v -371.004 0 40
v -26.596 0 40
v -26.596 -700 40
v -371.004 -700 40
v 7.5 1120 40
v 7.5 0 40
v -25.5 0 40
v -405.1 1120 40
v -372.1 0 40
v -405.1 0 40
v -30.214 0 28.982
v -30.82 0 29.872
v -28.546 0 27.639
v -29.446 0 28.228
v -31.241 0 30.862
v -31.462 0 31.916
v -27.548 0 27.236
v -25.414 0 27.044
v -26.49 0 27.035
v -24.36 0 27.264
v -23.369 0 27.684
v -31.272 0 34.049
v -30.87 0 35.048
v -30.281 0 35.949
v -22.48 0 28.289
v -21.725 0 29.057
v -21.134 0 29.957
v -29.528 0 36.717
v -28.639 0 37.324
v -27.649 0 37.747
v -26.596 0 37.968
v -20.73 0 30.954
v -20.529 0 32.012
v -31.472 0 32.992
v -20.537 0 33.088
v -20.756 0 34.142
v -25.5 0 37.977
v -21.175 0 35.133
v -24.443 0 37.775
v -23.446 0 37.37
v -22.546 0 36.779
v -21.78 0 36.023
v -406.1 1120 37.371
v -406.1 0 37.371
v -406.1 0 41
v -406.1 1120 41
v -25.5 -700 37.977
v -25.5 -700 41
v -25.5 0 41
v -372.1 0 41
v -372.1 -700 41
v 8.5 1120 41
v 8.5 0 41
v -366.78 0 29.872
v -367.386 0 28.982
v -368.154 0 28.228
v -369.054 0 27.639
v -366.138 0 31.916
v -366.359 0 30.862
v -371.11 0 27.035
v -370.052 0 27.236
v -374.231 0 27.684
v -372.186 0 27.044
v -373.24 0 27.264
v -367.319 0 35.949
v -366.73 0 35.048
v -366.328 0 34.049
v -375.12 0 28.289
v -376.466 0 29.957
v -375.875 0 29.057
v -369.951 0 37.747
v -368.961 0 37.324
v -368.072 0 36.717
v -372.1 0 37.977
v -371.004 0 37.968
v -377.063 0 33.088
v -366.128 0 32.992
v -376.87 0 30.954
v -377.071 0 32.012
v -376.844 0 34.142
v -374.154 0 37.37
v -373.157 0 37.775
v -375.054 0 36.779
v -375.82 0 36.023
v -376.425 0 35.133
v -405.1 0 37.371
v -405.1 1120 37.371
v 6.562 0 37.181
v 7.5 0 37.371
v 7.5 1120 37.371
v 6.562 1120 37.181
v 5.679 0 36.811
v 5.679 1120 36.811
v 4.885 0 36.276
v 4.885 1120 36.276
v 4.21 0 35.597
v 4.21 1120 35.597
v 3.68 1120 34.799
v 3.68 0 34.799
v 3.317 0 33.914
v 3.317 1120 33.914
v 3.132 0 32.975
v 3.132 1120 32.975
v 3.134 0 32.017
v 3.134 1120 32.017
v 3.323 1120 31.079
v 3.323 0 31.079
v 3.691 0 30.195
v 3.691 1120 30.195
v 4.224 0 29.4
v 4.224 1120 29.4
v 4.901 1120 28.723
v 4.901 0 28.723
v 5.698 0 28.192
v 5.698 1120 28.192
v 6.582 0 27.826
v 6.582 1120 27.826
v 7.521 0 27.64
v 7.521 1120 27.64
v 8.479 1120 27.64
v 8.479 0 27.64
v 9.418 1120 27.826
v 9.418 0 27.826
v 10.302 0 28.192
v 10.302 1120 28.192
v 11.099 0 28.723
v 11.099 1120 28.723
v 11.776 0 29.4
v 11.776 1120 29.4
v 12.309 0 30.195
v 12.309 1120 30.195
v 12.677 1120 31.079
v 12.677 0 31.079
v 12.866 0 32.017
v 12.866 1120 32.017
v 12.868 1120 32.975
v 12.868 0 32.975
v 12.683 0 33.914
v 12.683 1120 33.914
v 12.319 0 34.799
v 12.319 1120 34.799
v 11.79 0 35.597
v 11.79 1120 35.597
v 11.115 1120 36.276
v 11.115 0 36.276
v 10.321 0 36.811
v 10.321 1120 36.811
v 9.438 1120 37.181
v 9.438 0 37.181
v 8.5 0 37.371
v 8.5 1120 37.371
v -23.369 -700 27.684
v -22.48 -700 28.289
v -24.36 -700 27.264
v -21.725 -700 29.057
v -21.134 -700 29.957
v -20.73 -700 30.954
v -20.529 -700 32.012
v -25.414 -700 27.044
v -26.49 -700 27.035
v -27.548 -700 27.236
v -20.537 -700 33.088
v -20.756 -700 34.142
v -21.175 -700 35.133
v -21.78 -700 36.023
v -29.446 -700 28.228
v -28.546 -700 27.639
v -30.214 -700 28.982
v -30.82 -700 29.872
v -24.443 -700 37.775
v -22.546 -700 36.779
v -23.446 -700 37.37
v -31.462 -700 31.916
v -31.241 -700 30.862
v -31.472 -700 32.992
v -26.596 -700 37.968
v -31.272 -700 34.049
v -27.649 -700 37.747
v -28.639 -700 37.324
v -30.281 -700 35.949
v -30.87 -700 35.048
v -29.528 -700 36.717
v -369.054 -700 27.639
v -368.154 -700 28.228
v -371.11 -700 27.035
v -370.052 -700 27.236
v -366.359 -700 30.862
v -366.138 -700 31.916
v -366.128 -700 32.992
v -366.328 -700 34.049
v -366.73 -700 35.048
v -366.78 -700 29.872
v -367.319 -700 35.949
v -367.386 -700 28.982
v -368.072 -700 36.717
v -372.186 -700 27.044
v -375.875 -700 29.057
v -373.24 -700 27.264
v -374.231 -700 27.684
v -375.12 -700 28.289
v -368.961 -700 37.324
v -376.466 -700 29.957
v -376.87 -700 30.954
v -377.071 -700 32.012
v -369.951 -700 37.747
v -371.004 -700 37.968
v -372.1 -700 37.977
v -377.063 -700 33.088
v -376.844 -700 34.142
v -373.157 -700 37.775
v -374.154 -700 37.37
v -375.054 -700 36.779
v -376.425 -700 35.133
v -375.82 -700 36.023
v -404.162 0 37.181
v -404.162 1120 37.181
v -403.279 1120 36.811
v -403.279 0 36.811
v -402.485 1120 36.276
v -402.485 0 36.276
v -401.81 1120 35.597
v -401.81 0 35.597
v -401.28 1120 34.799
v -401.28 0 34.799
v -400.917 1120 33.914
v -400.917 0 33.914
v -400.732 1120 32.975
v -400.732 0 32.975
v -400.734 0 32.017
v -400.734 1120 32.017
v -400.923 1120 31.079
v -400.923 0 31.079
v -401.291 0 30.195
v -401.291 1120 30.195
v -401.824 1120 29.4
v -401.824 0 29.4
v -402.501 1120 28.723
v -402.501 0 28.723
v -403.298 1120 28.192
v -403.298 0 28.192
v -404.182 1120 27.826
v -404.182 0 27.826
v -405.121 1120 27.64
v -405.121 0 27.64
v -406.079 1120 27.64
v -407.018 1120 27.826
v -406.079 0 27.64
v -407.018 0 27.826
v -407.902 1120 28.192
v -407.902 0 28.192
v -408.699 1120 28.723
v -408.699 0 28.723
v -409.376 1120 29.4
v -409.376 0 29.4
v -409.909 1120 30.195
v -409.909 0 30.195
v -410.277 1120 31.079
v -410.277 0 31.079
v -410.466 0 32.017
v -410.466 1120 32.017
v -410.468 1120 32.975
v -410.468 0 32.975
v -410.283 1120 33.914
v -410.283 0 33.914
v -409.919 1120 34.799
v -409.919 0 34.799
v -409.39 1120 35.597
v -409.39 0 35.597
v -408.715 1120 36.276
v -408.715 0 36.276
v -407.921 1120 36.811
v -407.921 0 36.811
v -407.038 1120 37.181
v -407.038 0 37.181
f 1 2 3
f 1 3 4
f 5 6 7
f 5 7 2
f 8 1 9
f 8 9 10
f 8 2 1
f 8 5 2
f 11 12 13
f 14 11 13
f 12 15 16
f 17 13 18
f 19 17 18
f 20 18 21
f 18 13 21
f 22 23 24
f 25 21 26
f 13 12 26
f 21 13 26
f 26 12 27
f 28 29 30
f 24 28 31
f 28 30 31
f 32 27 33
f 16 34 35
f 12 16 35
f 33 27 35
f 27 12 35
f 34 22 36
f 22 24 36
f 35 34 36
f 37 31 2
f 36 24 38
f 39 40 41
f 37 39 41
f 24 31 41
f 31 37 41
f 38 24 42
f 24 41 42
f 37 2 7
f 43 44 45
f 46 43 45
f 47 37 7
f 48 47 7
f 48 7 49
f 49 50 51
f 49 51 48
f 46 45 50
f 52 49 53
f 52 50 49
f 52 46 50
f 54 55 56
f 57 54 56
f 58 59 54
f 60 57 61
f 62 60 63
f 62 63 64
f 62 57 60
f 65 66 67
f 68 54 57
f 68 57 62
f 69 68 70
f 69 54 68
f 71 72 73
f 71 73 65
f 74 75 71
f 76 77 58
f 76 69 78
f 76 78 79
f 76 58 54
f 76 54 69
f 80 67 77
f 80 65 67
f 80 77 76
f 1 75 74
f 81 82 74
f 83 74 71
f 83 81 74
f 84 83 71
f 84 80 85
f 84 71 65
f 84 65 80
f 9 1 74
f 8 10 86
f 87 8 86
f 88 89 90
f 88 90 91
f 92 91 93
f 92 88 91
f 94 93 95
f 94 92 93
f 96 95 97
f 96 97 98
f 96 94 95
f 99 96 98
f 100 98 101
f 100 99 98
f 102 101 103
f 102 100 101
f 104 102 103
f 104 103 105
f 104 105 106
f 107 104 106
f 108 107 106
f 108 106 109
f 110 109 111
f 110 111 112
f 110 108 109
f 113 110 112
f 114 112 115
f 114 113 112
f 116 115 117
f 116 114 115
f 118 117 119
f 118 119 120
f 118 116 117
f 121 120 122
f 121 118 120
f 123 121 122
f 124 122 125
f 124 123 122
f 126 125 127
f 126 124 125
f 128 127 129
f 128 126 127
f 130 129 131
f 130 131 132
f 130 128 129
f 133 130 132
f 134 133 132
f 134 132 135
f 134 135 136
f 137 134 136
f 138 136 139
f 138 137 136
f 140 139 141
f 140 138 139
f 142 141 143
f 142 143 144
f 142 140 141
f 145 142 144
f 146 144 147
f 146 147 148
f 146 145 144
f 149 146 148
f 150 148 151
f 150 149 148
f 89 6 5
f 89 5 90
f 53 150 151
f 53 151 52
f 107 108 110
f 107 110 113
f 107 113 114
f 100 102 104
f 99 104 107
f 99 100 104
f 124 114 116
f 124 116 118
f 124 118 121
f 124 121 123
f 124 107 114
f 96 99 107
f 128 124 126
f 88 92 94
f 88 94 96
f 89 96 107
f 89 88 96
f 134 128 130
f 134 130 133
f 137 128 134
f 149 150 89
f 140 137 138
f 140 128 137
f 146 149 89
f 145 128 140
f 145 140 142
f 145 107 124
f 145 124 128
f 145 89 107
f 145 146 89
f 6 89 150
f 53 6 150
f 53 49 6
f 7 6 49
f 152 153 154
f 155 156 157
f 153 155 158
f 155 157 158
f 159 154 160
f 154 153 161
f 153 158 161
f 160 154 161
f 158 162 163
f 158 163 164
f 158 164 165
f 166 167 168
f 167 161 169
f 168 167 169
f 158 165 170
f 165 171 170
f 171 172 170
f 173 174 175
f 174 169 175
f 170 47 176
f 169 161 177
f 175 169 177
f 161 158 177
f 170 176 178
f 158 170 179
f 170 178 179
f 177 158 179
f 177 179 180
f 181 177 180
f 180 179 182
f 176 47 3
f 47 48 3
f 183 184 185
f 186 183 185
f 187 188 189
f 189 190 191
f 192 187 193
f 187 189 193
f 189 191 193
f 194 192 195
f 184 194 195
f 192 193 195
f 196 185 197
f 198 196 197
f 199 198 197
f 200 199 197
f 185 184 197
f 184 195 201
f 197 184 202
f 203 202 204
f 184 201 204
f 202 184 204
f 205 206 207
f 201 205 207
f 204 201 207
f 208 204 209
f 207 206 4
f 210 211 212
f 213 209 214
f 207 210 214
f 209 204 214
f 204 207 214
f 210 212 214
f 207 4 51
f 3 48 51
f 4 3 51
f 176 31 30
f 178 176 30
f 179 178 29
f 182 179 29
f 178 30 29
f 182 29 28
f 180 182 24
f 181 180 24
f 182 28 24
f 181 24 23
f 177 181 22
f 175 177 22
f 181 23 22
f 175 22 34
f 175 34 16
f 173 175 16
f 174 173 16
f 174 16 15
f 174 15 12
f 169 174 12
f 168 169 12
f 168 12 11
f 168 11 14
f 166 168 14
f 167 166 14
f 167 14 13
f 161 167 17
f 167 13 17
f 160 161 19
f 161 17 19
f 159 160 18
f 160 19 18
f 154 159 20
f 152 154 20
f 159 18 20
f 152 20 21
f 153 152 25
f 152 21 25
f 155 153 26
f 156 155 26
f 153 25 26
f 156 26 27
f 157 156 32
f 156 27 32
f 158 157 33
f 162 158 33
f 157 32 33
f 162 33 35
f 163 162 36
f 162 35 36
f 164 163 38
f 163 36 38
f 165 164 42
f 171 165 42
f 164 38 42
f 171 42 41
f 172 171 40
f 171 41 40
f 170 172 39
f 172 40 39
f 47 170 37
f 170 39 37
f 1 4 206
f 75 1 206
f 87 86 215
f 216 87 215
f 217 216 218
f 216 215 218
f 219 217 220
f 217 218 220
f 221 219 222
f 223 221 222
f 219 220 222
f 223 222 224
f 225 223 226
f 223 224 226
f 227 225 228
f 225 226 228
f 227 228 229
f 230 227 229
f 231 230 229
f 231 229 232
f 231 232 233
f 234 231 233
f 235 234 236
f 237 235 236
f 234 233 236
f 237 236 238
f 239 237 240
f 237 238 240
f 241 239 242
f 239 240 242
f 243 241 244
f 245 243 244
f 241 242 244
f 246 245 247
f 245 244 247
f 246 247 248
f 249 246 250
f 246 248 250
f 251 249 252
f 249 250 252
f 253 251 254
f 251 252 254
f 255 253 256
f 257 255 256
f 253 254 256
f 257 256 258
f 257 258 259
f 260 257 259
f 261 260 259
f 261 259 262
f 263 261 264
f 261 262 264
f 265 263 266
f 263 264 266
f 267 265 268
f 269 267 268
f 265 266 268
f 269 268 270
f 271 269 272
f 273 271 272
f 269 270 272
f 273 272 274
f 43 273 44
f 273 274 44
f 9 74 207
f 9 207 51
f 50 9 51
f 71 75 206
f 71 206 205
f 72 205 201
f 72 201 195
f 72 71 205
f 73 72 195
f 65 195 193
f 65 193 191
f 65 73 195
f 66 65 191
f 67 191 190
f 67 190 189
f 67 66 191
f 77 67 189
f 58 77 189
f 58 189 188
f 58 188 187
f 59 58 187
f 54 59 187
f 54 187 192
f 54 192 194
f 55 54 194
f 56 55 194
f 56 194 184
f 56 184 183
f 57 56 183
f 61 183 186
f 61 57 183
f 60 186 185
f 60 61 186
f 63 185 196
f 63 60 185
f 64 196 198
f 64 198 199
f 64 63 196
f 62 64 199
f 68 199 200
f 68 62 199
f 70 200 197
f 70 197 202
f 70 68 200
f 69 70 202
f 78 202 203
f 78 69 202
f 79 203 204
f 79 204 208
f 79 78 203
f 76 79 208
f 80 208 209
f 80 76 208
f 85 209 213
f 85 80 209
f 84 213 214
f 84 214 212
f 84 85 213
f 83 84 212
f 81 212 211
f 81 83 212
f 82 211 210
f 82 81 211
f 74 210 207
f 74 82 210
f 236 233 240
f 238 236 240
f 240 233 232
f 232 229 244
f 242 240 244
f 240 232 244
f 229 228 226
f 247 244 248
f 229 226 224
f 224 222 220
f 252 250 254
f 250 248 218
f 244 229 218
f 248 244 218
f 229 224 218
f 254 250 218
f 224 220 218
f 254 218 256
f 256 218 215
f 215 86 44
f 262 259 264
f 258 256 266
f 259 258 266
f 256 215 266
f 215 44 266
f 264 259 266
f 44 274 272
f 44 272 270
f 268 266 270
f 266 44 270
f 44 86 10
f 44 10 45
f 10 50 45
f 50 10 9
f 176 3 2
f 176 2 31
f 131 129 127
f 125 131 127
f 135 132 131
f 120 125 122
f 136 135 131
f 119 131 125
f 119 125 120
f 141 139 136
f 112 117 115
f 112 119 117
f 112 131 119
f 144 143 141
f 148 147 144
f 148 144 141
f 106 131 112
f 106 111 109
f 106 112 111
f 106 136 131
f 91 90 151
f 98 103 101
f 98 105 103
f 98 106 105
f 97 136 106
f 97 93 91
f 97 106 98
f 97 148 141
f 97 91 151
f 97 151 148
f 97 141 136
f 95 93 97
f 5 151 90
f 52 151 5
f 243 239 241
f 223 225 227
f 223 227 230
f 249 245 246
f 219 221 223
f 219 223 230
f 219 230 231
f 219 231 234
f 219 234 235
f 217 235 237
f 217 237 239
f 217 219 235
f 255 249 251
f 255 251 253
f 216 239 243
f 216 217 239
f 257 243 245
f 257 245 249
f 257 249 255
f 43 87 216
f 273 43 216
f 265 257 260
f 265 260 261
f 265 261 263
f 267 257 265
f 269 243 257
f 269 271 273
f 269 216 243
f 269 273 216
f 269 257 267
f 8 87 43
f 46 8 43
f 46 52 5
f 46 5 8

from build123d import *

# Parameters (mm, degrees)
F2_DEPTH  = 1910
F7_DEPTH  = 1120
F9_DEPTH  = 2000
F11_DEPTH = 700


# Not quite as in the source:
# - ends of sketch curves that miss each other by under 0.0002 mm in the source are joined


with BuildPart() as f2:
    # F1 (on Front) → F2 (new body)
    with BuildSketch(Plane.XZ):
        with BuildLine():
            Line((7.5, 37.974085065), (7.5, 40))
            Line((7.5, 40), (-15, 40))
            Line((-15, 40), (-15, 37))
            Line((-15, 37), (-15, 31))
            Line((-15, 31), (-15, 29))
            Line((-15, 29), (-15, 26))
            Line((-15, 26), (-15, 24))
            Line((-15, 24), (-13, 24))
            Line((-13, 24), (-11, 24))
            Line((-11, 24), (-11, 26))
            Line((-11, 26), (-9, 26))
            Line((-9, 26), (-9, 20))
            Line((-9, 20), (-11, 20))
            Line((-11, 20), (-11, 22))
            Line((-11, 22), (-15, 22))
            Line((-15, 22), (-15, 18))
            Line((-15, 18), (-15, 7.7))
            Line((-15, 7.7), (-13, 7.7))
            Line((-13, 7.7), (-13, 11.4920835048))
            Line((-13, 11.4920835048), (-7, 11.4920835048))
            Line((-7, 11.4920835048), (-7, 3.7))
            Line((-7, 3.7), (-11, 3.7))
            Line((-11, 3.7), (-11, 5.7))
            Line((-11, 5.7), (-15, 5.7))
            Line((-15, 5.7), (-15, 3))
            Line((-15, 3), (-15, 0))
            Line((-15, 0), (-13, 0))
            Line((-13, 0), (-12, 0))
            Line((-12, 0), (-5, 0))
            Line((-5, 0), (-5, 13.4920835048))
            Line((-5, 13.4920835048), (-7, 13.4920835048))
            Line((-7, 13.4920835048), (-9.1588944197, 13.4920835048))
            Line((-9.1588944197, 13.4920835048), (-9.1588944197, 15.4920835048))
            Line((-9.1588944197, 15.4920835048), (1.5, 20))
            Line((1.5, 20), (10.8411055803, 15.4920835048))
            Line((10.8411055803, 15.4920835048), (10.8411055803, 13.4920835048))
            Line((10.8411055803, 13.4920835048), (8, 13.4920835048))
            Line((8, 13.4920835048), (8, 0))
            Line((8, 0), (17, 0))
            Line((17, 0), (17, 40))
            Line((17, 40), (8.5, 40))
            Line((8.5, 40), (8.5, 37.974085065))
            ThreePointArc((8.5, 37.974085065), (11.5604089792, 36.6859489396), (13.3185590744, 33.8691589154))
            Line((13.3185590744, 33.8691589154), (13.4318527537, 31.7073867348))
            ThreePointArc((13.4318527537, 31.7073867348), (4.0126863822, 28.7323088758), (7.5, 37.974085065))
        make_face()
        Polygon((-8.3634709733, 18), (-11.1588944197, 16.817744602), (-11.1588944197, 15.4920835048), (-11.1588944197, 13.4920835048), (-13, 13.4920835048), (-13, 18), align=None, mode=Mode.SUBTRACT)
        with BuildLine():
            Line((-13, 34), (-13, 37.9999987781))
            Line((-13, 37.9999987781), (2.9081163149, 37.9999987781))
            ThreePointArc((2.9081163149, 37.9999987781), (3.810445381, 26.2974906682), (15, 29.8410427327))
            Line((15, 29.8410427327), (15, 2))
            Line((15, 2), (10, 2))
            Line((10, 2), (10, 12))
            Line((10, 12), (12.8411055803, 12))
            Line((12.8411055803, 12), (12.8411055803, 16.7476188273))
            Line((12.8411055803, 16.7476188273), (1.5543358685, 22.194491783))
            Line((1.5543358685, 22.194491783), (-7, 18.5766464184))
            Line((-7, 18.5766464184), (-7, 28))
            Line((-7, 28), (-13, 28))
            Line((-13, 28), (-13, 34))
        make_face(mode=Mode.SUBTRACT)
        with BuildLine():
            Line((13.0918836851, 37.9999987781), (13.1020709306, 37.9999987781))
            Line((13.1020709306, 37.9999987781), (13.1025921338, 37.9900536295))
            ThreePointArc((13.1025921338, 37.9900536295), (13.0972403349, 37.9950288154), (13.0918836851, 37.9999987781))
        make_face(mode=Mode.SUBTRACT)
    extrude(amount=-F2_DEPTH)

    # F6 (on Front) → F7 (join)
    with BuildSketch(Plane.XZ):
        with BuildLine():
            Line((8.5, 37.3712719703), (8.5, 40))
            Line((8.5, 40), (8.5, 41))
            Line((8.5, 41), (-198.8, 41))
            Line((-198.8, 41), (-198.8, 40))
            Line((-198.8, 40), (-25.5, 40))
            Line((-25.5, 40), (-15, 40))
            Line((-15, 40), (7.5, 40))
            Line((7.5, 40), (7.5, 37.3712723193))
            ThreePointArc((7.5, 37.3712723193), (7.9999999822, 27.6162403216), (8.5, 37.3712719703))
        make_face()
    extrude(amount=-F7_DEPTH)

    # F8 (on face) → F9 (cut)
    with BuildSketch(Plane.XZ):
        with BuildLine():
            Line((-15, 3), (-15, 0))
            Line((-15, 0), (-13, 0))
            Line((-13, 0), (-12, 0))
            Line((-12, 0), (-5, 0))
            Line((-5, 0), (-5, 13.4920835048))
            Line((-5, 13.4920835048), (-7, 13.4920835048))
            Line((-7, 13.4920835048), (-9.1588944197, 13.4920835048))
            Line((-9.1588944197, 13.4920835048), (-9.1588944197, 15.4920835048))
            Line((-9.1588944197, 15.4920835048), (1.5, 20))
            Line((1.5, 20), (10.8411055803, 15.4920835048))
            Line((10.8411055803, 15.4920835048), (10.8411055803, 13.4920835048))
            Line((10.8411055803, 13.4920835048), (8, 13.4920835048))
            Line((8, 13.4920835048), (8, 0))
            Line((8, 0), (17, 0))
            Line((17, 0), (17, 40))
            Line((17, 40), (8.5, 40))
            Line((8.5, 40), (8.5, 37.974085065))
            ThreePointArc((8.5, 37.974085065), (11.5604089792, 36.6859489396), (13.3185590744, 33.8691589154))
            Line((13.3185590744, 33.8691589154), (13.4318527537, 31.7073867348))
            ThreePointArc((13.4318527537, 31.7073867348), (4.0126863822, 28.7323088758), (7.5, 37.974085065))
            Line((7.5, 37.974085065), (7.5, 40))
            Line((7.5, 40), (-15, 40))
            Line((-15, 40), (-15, 31))
            Line((-15, 31), (-15, 29))
            Line((-15, 29), (-15, 24))
            Line((-15, 24), (-13, 24))
            Line((-13, 24), (-11, 24))
            Line((-11, 24), (-11, 26))
            Line((-11, 26), (-9, 26))
            Line((-9, 26), (-9, 20))
            Line((-9, 20), (-11, 20))
            Line((-11, 20), (-11, 22))
            Line((-11, 22), (-15, 22))
            Line((-15, 22), (-15, 18))
            Line((-15, 18), (-15, 7.7))
            Line((-15, 7.7), (-13, 7.7))
            Line((-13, 7.7), (-13, 11.4920835048))
            Line((-13, 11.4920835048), (-7, 11.4920835048))
            Line((-7, 11.4920835048), (-7, 3.7))
            Line((-7, 3.7), (-11, 3.7))
            Line((-11, 3.7), (-11, 5.7))
            Line((-11, 5.7), (-15, 5.7))
            Line((-15, 5.7), (-15, 3))
        make_face()
        Polygon((-13, 18), (-8.3634709733, 18), (-11.1588944197, 16.817744602), (-11.1588944197, 15.4920835048), (-11.1588944197, 13.4920835048), (-13, 13.4920835048), align=None, mode=Mode.SUBTRACT)
        with BuildLine():
            Line((12.8411055803, 12), (12.8411055803, 16.7476188273))
            Line((12.8411055803, 16.7476188273), (1.5543358685, 22.194491783))
            Line((1.5543358685, 22.194491783), (-7, 18.5766464184))
            Line((-7, 18.5766464184), (-7, 28))
            Line((-7, 28), (-13, 28))
            Line((-13, 28), (-13, 34))
            Line((-13, 34), (-13, 37.9999987781))
            Line((-13, 37.9999987781), (2.9081163149, 37.9999987781))
            ThreePointArc((2.9081163149, 37.9999987781), (3.810445381, 26.2974906682), (15, 29.8410427327))
            Line((15, 29.8410427327), (15, 2))
            Line((15, 2), (10, 2))
            Line((10, 2), (10, 12))
            Line((10, 12), (12.8411055803, 12))
        make_face(mode=Mode.SUBTRACT)
    extrude(amount=-F9_DEPTH, mode=Mode.SUBTRACT)

    # F10 (on face) → F11 (join)
    with BuildSketch(Plane.XZ):
        with BuildLine():
            Line((-49.096, 40), (-26.596, 40))
            Line((-26.596, 40), (-26.596, 37.9675733099))
            ThreePointArc((-26.596, 37.9675733099), (-25.951759356, 27.0133522571), (-25.5, 37.9771982231))
            Line((-25.5, 37.9771982231), (-25.5, 41))
            Line((-25.5, 41), (-198.8, 41))
            Line((-198.8, 41), (-198.8, 40))
            Line((-198.8, 40), (-49.096, 40))
        make_face()
    extrude(amount=F11_DEPTH)

    # F12: F2 across face


with BuildPart() as f2_1:
    add(f2.part)
    add(f2.part.mirror(Plane(origin=(-198.8, 210, 40.5), x_dir=(0, -1, 0), z_dir=(-1, 0, 0))))


solid = f2_1.part
